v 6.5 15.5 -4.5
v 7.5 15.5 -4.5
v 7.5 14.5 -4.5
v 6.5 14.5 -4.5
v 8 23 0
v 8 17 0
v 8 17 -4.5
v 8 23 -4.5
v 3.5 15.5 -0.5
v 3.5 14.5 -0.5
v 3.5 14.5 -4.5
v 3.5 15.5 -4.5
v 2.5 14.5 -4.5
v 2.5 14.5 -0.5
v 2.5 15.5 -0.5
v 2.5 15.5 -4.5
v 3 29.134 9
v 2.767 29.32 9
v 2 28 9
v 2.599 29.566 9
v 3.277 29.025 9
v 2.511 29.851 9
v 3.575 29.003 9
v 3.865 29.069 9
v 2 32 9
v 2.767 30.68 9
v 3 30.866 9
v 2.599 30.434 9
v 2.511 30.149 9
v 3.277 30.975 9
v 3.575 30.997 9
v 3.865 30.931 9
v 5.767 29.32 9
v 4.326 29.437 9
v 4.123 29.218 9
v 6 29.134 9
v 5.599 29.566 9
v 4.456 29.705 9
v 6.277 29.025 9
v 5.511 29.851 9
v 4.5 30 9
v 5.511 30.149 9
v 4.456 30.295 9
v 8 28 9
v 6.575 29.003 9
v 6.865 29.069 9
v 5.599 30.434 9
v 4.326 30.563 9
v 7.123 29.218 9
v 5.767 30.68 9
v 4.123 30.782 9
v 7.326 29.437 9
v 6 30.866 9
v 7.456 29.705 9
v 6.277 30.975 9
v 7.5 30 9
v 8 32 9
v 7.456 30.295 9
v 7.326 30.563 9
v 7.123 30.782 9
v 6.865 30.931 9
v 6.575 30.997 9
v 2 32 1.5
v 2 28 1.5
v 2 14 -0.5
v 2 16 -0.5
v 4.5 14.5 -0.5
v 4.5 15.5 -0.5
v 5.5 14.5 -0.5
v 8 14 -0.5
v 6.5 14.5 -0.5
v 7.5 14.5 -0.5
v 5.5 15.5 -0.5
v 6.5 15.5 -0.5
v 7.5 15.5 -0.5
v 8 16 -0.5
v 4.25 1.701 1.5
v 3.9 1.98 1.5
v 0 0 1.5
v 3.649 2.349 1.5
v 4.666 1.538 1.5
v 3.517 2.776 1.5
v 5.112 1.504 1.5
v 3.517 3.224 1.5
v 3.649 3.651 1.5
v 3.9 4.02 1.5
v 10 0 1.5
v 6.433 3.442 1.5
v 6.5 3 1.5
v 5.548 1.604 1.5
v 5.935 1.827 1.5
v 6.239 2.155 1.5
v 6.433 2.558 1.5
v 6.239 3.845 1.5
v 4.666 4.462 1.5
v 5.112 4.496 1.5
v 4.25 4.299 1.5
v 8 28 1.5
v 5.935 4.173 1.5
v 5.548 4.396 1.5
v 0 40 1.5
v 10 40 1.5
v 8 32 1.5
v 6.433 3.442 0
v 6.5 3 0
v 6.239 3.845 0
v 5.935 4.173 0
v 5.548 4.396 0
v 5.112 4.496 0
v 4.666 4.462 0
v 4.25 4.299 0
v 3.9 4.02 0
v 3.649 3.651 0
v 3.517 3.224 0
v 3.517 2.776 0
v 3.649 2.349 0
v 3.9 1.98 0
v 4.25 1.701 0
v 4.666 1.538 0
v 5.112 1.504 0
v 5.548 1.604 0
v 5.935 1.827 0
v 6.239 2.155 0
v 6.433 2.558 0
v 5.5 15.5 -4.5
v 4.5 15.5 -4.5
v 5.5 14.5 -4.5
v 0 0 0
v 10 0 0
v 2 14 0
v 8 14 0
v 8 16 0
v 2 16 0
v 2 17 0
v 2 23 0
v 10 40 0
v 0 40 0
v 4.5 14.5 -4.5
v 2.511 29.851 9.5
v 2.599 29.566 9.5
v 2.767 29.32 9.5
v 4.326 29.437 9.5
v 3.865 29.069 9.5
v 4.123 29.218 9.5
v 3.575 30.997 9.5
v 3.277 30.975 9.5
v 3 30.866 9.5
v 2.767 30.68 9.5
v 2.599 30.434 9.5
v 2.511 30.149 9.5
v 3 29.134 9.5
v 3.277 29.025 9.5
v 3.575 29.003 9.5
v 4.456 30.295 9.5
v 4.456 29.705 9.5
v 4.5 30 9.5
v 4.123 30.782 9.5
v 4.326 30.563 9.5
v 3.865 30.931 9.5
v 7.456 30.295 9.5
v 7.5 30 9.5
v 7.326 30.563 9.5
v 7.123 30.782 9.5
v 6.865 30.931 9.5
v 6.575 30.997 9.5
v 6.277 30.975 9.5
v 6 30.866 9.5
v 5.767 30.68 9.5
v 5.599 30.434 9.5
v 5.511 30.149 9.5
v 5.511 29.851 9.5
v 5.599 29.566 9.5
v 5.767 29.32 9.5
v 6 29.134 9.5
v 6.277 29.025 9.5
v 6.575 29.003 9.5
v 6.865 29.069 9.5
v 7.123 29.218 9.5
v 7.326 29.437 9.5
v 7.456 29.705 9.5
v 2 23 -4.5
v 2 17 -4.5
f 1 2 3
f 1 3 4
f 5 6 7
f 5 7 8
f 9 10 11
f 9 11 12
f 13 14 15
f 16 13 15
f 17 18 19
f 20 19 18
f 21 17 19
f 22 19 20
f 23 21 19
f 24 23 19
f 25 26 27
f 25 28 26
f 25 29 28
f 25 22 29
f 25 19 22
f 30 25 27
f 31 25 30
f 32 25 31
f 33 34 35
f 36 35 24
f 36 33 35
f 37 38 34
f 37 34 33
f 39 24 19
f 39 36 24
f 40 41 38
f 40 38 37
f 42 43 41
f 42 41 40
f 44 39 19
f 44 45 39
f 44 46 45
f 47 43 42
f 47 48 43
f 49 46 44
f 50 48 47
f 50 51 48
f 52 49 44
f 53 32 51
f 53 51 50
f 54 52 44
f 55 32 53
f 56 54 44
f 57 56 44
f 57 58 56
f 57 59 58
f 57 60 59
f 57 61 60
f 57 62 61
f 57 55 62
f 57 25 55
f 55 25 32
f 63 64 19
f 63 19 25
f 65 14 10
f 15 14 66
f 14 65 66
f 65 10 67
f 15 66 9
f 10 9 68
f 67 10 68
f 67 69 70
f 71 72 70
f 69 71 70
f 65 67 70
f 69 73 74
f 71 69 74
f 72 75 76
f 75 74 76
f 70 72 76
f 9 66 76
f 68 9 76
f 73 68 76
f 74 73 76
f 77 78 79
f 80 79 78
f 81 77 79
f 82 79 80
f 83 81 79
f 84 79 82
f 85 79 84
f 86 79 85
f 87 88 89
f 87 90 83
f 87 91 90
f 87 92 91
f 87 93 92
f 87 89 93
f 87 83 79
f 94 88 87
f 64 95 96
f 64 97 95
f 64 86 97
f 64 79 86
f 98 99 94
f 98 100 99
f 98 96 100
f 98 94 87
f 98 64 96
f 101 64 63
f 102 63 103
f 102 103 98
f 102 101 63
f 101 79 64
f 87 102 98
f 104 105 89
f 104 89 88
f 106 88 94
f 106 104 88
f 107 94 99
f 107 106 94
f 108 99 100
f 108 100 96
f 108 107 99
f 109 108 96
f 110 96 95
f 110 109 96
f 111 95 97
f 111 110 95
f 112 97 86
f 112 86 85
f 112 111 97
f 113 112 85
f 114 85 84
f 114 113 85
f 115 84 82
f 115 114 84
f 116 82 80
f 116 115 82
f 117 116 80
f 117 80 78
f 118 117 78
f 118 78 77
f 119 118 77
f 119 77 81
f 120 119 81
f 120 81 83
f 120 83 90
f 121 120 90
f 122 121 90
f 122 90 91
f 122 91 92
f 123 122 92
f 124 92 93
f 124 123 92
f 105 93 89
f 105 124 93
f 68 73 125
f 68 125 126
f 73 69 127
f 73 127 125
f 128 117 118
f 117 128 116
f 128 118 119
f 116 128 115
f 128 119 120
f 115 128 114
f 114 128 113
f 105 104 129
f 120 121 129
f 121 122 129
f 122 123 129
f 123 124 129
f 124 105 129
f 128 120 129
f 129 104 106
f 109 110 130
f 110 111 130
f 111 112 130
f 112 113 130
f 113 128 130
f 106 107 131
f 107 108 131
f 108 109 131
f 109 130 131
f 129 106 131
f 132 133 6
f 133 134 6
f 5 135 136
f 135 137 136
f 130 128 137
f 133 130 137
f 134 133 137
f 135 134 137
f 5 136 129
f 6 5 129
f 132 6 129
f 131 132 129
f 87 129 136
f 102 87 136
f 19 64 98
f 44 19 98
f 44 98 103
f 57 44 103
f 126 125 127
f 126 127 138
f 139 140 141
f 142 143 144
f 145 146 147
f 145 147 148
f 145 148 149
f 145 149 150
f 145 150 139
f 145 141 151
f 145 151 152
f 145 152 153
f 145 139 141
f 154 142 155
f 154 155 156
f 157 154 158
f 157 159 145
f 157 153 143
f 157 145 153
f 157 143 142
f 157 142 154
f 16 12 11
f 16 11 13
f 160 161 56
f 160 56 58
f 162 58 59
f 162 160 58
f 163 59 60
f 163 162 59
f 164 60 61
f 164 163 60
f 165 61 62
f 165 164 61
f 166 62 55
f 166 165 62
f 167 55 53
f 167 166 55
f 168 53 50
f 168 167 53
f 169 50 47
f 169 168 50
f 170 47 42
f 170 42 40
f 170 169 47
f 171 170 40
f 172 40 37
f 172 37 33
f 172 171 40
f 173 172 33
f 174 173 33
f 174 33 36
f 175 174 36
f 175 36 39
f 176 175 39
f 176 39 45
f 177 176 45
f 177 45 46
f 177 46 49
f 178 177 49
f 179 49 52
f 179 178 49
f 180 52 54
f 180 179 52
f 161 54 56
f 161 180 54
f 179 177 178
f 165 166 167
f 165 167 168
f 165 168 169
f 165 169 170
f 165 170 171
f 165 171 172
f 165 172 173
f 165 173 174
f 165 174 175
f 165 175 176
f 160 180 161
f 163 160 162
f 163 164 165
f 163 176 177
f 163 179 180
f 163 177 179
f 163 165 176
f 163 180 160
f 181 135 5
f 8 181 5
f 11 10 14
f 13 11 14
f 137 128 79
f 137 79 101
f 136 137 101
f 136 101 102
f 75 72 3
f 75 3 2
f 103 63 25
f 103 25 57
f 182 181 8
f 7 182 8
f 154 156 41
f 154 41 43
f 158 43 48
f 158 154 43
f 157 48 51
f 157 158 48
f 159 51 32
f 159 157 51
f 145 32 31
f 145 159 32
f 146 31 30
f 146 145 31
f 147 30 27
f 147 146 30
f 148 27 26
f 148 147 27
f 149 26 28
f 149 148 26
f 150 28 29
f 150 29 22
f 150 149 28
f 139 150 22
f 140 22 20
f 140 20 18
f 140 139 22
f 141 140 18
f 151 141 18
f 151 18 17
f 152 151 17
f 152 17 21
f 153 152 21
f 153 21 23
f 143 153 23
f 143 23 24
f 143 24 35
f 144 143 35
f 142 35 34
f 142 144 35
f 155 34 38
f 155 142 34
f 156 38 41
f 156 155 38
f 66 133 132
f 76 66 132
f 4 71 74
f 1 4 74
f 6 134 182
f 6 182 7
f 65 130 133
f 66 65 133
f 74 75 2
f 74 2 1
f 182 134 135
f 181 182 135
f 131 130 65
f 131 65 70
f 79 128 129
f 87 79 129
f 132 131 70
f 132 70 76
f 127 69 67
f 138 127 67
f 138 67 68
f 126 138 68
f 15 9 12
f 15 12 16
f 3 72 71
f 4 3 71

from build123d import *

# Parameters (mm, degrees)
SKETCH_2_W          = 10
SKETCH_2_H          = 40
SKETCH_2_R          = 1.5
EXTRUDE_1_DEPTH     = 1.5
SKETCH_3_W          = 6
SKETCH_3_H          = 4
EXTRUDE_2_DEPTH     = 8
SKETCH_3_3_W        = 6
SKETCH_3_3_H        = 6
EXTRUDE_3_DEPTH     = 6
SKETCH_3_4_W        = 6
SKETCH_3_4_H        = 2
EXTRUDE_4_DEPTH     = 2
SKETCH_4_W          = 1
SKETCH_4_H          = 1
EXTRUDE_5_DEPTH     = 4
SKETCH_5_W          = 6
SKETCH_5_H          = 4
SKETCH_5_R          = 1
CUT_EXTRUDE_1_DEPTH = 0.5


with BuildPart() as part:
    # 草圖2 → 填料-伸長1 (new body)
    with BuildSketch(Plane.XY):
        with Locations((5, 20)):
            Rectangle(SKETCH_2_W, SKETCH_2_H)
        with Locations((5, 3)):
            Circle(SKETCH_2_R, mode=Mode.SUBTRACT)
    extrude(amount=EXTRUDE_1_DEPTH)

    # 草圖3 → 填料-伸長2 (add)
    with BuildSketch(Plane.XY.offset(1.5)):
        with Locations((5, 30)):
            Rectangle(SKETCH_3_W, SKETCH_3_H)
    extrude(amount=EXTRUDE_2_DEPTH)

    # 草圖3<3> → 填料-伸長3 (add)
    with BuildSketch(Plane.XY.offset(1.5)):
        with Locations((5, 20)):
            Rectangle(SKETCH_3_3_W, SKETCH_3_3_H)
    extrude(amount=-EXTRUDE_3_DEPTH)

    # 草圖3<4> → 填料-伸長4 (add)
    with BuildSketch(Plane.XY.offset(1.5)):
        with Locations((5, 15)):
            Rectangle(SKETCH_3_4_W, SKETCH_3_4_H)
    extrude(amount=-EXTRUDE_4_DEPTH)

    # 草圖4 → 填料-伸長5 (add)
    with BuildSketch(Plane(origin=(0, 0, -0.5), x_dir=(-1, 0, 0), z_dir=(0, 0, -1))):
        with Locations((-5, 15)):
            Rectangle(SKETCH_4_W, SKETCH_4_H)
        with Locations((-7, 15)):
            Rectangle(SKETCH_4_W, SKETCH_4_H)
        with Locations((-3, 15)):
            Rectangle(SKETCH_4_W, SKETCH_4_H)
    extrude(amount=EXTRUDE_5_DEPTH)

    # 草圖5 → 除料-伸長1 (cut)
    with BuildSketch(Plane.XY.offset(9.5)):
        with Locations((5, 30)):
            Rectangle(SKETCH_5_W, SKETCH_5_H)
        with Locations((3.5, 30)):
            Circle(SKETCH_5_R, mode=Mode.SUBTRACT)
        with Locations((6.5, 30)):
            Circle(SKETCH_5_R, mode=Mode.SUBTRACT)
    extrude(amount=-CUT_EXTRUDE_1_DEPTH, mode=Mode.SUBTRACT)


solid = part.part
